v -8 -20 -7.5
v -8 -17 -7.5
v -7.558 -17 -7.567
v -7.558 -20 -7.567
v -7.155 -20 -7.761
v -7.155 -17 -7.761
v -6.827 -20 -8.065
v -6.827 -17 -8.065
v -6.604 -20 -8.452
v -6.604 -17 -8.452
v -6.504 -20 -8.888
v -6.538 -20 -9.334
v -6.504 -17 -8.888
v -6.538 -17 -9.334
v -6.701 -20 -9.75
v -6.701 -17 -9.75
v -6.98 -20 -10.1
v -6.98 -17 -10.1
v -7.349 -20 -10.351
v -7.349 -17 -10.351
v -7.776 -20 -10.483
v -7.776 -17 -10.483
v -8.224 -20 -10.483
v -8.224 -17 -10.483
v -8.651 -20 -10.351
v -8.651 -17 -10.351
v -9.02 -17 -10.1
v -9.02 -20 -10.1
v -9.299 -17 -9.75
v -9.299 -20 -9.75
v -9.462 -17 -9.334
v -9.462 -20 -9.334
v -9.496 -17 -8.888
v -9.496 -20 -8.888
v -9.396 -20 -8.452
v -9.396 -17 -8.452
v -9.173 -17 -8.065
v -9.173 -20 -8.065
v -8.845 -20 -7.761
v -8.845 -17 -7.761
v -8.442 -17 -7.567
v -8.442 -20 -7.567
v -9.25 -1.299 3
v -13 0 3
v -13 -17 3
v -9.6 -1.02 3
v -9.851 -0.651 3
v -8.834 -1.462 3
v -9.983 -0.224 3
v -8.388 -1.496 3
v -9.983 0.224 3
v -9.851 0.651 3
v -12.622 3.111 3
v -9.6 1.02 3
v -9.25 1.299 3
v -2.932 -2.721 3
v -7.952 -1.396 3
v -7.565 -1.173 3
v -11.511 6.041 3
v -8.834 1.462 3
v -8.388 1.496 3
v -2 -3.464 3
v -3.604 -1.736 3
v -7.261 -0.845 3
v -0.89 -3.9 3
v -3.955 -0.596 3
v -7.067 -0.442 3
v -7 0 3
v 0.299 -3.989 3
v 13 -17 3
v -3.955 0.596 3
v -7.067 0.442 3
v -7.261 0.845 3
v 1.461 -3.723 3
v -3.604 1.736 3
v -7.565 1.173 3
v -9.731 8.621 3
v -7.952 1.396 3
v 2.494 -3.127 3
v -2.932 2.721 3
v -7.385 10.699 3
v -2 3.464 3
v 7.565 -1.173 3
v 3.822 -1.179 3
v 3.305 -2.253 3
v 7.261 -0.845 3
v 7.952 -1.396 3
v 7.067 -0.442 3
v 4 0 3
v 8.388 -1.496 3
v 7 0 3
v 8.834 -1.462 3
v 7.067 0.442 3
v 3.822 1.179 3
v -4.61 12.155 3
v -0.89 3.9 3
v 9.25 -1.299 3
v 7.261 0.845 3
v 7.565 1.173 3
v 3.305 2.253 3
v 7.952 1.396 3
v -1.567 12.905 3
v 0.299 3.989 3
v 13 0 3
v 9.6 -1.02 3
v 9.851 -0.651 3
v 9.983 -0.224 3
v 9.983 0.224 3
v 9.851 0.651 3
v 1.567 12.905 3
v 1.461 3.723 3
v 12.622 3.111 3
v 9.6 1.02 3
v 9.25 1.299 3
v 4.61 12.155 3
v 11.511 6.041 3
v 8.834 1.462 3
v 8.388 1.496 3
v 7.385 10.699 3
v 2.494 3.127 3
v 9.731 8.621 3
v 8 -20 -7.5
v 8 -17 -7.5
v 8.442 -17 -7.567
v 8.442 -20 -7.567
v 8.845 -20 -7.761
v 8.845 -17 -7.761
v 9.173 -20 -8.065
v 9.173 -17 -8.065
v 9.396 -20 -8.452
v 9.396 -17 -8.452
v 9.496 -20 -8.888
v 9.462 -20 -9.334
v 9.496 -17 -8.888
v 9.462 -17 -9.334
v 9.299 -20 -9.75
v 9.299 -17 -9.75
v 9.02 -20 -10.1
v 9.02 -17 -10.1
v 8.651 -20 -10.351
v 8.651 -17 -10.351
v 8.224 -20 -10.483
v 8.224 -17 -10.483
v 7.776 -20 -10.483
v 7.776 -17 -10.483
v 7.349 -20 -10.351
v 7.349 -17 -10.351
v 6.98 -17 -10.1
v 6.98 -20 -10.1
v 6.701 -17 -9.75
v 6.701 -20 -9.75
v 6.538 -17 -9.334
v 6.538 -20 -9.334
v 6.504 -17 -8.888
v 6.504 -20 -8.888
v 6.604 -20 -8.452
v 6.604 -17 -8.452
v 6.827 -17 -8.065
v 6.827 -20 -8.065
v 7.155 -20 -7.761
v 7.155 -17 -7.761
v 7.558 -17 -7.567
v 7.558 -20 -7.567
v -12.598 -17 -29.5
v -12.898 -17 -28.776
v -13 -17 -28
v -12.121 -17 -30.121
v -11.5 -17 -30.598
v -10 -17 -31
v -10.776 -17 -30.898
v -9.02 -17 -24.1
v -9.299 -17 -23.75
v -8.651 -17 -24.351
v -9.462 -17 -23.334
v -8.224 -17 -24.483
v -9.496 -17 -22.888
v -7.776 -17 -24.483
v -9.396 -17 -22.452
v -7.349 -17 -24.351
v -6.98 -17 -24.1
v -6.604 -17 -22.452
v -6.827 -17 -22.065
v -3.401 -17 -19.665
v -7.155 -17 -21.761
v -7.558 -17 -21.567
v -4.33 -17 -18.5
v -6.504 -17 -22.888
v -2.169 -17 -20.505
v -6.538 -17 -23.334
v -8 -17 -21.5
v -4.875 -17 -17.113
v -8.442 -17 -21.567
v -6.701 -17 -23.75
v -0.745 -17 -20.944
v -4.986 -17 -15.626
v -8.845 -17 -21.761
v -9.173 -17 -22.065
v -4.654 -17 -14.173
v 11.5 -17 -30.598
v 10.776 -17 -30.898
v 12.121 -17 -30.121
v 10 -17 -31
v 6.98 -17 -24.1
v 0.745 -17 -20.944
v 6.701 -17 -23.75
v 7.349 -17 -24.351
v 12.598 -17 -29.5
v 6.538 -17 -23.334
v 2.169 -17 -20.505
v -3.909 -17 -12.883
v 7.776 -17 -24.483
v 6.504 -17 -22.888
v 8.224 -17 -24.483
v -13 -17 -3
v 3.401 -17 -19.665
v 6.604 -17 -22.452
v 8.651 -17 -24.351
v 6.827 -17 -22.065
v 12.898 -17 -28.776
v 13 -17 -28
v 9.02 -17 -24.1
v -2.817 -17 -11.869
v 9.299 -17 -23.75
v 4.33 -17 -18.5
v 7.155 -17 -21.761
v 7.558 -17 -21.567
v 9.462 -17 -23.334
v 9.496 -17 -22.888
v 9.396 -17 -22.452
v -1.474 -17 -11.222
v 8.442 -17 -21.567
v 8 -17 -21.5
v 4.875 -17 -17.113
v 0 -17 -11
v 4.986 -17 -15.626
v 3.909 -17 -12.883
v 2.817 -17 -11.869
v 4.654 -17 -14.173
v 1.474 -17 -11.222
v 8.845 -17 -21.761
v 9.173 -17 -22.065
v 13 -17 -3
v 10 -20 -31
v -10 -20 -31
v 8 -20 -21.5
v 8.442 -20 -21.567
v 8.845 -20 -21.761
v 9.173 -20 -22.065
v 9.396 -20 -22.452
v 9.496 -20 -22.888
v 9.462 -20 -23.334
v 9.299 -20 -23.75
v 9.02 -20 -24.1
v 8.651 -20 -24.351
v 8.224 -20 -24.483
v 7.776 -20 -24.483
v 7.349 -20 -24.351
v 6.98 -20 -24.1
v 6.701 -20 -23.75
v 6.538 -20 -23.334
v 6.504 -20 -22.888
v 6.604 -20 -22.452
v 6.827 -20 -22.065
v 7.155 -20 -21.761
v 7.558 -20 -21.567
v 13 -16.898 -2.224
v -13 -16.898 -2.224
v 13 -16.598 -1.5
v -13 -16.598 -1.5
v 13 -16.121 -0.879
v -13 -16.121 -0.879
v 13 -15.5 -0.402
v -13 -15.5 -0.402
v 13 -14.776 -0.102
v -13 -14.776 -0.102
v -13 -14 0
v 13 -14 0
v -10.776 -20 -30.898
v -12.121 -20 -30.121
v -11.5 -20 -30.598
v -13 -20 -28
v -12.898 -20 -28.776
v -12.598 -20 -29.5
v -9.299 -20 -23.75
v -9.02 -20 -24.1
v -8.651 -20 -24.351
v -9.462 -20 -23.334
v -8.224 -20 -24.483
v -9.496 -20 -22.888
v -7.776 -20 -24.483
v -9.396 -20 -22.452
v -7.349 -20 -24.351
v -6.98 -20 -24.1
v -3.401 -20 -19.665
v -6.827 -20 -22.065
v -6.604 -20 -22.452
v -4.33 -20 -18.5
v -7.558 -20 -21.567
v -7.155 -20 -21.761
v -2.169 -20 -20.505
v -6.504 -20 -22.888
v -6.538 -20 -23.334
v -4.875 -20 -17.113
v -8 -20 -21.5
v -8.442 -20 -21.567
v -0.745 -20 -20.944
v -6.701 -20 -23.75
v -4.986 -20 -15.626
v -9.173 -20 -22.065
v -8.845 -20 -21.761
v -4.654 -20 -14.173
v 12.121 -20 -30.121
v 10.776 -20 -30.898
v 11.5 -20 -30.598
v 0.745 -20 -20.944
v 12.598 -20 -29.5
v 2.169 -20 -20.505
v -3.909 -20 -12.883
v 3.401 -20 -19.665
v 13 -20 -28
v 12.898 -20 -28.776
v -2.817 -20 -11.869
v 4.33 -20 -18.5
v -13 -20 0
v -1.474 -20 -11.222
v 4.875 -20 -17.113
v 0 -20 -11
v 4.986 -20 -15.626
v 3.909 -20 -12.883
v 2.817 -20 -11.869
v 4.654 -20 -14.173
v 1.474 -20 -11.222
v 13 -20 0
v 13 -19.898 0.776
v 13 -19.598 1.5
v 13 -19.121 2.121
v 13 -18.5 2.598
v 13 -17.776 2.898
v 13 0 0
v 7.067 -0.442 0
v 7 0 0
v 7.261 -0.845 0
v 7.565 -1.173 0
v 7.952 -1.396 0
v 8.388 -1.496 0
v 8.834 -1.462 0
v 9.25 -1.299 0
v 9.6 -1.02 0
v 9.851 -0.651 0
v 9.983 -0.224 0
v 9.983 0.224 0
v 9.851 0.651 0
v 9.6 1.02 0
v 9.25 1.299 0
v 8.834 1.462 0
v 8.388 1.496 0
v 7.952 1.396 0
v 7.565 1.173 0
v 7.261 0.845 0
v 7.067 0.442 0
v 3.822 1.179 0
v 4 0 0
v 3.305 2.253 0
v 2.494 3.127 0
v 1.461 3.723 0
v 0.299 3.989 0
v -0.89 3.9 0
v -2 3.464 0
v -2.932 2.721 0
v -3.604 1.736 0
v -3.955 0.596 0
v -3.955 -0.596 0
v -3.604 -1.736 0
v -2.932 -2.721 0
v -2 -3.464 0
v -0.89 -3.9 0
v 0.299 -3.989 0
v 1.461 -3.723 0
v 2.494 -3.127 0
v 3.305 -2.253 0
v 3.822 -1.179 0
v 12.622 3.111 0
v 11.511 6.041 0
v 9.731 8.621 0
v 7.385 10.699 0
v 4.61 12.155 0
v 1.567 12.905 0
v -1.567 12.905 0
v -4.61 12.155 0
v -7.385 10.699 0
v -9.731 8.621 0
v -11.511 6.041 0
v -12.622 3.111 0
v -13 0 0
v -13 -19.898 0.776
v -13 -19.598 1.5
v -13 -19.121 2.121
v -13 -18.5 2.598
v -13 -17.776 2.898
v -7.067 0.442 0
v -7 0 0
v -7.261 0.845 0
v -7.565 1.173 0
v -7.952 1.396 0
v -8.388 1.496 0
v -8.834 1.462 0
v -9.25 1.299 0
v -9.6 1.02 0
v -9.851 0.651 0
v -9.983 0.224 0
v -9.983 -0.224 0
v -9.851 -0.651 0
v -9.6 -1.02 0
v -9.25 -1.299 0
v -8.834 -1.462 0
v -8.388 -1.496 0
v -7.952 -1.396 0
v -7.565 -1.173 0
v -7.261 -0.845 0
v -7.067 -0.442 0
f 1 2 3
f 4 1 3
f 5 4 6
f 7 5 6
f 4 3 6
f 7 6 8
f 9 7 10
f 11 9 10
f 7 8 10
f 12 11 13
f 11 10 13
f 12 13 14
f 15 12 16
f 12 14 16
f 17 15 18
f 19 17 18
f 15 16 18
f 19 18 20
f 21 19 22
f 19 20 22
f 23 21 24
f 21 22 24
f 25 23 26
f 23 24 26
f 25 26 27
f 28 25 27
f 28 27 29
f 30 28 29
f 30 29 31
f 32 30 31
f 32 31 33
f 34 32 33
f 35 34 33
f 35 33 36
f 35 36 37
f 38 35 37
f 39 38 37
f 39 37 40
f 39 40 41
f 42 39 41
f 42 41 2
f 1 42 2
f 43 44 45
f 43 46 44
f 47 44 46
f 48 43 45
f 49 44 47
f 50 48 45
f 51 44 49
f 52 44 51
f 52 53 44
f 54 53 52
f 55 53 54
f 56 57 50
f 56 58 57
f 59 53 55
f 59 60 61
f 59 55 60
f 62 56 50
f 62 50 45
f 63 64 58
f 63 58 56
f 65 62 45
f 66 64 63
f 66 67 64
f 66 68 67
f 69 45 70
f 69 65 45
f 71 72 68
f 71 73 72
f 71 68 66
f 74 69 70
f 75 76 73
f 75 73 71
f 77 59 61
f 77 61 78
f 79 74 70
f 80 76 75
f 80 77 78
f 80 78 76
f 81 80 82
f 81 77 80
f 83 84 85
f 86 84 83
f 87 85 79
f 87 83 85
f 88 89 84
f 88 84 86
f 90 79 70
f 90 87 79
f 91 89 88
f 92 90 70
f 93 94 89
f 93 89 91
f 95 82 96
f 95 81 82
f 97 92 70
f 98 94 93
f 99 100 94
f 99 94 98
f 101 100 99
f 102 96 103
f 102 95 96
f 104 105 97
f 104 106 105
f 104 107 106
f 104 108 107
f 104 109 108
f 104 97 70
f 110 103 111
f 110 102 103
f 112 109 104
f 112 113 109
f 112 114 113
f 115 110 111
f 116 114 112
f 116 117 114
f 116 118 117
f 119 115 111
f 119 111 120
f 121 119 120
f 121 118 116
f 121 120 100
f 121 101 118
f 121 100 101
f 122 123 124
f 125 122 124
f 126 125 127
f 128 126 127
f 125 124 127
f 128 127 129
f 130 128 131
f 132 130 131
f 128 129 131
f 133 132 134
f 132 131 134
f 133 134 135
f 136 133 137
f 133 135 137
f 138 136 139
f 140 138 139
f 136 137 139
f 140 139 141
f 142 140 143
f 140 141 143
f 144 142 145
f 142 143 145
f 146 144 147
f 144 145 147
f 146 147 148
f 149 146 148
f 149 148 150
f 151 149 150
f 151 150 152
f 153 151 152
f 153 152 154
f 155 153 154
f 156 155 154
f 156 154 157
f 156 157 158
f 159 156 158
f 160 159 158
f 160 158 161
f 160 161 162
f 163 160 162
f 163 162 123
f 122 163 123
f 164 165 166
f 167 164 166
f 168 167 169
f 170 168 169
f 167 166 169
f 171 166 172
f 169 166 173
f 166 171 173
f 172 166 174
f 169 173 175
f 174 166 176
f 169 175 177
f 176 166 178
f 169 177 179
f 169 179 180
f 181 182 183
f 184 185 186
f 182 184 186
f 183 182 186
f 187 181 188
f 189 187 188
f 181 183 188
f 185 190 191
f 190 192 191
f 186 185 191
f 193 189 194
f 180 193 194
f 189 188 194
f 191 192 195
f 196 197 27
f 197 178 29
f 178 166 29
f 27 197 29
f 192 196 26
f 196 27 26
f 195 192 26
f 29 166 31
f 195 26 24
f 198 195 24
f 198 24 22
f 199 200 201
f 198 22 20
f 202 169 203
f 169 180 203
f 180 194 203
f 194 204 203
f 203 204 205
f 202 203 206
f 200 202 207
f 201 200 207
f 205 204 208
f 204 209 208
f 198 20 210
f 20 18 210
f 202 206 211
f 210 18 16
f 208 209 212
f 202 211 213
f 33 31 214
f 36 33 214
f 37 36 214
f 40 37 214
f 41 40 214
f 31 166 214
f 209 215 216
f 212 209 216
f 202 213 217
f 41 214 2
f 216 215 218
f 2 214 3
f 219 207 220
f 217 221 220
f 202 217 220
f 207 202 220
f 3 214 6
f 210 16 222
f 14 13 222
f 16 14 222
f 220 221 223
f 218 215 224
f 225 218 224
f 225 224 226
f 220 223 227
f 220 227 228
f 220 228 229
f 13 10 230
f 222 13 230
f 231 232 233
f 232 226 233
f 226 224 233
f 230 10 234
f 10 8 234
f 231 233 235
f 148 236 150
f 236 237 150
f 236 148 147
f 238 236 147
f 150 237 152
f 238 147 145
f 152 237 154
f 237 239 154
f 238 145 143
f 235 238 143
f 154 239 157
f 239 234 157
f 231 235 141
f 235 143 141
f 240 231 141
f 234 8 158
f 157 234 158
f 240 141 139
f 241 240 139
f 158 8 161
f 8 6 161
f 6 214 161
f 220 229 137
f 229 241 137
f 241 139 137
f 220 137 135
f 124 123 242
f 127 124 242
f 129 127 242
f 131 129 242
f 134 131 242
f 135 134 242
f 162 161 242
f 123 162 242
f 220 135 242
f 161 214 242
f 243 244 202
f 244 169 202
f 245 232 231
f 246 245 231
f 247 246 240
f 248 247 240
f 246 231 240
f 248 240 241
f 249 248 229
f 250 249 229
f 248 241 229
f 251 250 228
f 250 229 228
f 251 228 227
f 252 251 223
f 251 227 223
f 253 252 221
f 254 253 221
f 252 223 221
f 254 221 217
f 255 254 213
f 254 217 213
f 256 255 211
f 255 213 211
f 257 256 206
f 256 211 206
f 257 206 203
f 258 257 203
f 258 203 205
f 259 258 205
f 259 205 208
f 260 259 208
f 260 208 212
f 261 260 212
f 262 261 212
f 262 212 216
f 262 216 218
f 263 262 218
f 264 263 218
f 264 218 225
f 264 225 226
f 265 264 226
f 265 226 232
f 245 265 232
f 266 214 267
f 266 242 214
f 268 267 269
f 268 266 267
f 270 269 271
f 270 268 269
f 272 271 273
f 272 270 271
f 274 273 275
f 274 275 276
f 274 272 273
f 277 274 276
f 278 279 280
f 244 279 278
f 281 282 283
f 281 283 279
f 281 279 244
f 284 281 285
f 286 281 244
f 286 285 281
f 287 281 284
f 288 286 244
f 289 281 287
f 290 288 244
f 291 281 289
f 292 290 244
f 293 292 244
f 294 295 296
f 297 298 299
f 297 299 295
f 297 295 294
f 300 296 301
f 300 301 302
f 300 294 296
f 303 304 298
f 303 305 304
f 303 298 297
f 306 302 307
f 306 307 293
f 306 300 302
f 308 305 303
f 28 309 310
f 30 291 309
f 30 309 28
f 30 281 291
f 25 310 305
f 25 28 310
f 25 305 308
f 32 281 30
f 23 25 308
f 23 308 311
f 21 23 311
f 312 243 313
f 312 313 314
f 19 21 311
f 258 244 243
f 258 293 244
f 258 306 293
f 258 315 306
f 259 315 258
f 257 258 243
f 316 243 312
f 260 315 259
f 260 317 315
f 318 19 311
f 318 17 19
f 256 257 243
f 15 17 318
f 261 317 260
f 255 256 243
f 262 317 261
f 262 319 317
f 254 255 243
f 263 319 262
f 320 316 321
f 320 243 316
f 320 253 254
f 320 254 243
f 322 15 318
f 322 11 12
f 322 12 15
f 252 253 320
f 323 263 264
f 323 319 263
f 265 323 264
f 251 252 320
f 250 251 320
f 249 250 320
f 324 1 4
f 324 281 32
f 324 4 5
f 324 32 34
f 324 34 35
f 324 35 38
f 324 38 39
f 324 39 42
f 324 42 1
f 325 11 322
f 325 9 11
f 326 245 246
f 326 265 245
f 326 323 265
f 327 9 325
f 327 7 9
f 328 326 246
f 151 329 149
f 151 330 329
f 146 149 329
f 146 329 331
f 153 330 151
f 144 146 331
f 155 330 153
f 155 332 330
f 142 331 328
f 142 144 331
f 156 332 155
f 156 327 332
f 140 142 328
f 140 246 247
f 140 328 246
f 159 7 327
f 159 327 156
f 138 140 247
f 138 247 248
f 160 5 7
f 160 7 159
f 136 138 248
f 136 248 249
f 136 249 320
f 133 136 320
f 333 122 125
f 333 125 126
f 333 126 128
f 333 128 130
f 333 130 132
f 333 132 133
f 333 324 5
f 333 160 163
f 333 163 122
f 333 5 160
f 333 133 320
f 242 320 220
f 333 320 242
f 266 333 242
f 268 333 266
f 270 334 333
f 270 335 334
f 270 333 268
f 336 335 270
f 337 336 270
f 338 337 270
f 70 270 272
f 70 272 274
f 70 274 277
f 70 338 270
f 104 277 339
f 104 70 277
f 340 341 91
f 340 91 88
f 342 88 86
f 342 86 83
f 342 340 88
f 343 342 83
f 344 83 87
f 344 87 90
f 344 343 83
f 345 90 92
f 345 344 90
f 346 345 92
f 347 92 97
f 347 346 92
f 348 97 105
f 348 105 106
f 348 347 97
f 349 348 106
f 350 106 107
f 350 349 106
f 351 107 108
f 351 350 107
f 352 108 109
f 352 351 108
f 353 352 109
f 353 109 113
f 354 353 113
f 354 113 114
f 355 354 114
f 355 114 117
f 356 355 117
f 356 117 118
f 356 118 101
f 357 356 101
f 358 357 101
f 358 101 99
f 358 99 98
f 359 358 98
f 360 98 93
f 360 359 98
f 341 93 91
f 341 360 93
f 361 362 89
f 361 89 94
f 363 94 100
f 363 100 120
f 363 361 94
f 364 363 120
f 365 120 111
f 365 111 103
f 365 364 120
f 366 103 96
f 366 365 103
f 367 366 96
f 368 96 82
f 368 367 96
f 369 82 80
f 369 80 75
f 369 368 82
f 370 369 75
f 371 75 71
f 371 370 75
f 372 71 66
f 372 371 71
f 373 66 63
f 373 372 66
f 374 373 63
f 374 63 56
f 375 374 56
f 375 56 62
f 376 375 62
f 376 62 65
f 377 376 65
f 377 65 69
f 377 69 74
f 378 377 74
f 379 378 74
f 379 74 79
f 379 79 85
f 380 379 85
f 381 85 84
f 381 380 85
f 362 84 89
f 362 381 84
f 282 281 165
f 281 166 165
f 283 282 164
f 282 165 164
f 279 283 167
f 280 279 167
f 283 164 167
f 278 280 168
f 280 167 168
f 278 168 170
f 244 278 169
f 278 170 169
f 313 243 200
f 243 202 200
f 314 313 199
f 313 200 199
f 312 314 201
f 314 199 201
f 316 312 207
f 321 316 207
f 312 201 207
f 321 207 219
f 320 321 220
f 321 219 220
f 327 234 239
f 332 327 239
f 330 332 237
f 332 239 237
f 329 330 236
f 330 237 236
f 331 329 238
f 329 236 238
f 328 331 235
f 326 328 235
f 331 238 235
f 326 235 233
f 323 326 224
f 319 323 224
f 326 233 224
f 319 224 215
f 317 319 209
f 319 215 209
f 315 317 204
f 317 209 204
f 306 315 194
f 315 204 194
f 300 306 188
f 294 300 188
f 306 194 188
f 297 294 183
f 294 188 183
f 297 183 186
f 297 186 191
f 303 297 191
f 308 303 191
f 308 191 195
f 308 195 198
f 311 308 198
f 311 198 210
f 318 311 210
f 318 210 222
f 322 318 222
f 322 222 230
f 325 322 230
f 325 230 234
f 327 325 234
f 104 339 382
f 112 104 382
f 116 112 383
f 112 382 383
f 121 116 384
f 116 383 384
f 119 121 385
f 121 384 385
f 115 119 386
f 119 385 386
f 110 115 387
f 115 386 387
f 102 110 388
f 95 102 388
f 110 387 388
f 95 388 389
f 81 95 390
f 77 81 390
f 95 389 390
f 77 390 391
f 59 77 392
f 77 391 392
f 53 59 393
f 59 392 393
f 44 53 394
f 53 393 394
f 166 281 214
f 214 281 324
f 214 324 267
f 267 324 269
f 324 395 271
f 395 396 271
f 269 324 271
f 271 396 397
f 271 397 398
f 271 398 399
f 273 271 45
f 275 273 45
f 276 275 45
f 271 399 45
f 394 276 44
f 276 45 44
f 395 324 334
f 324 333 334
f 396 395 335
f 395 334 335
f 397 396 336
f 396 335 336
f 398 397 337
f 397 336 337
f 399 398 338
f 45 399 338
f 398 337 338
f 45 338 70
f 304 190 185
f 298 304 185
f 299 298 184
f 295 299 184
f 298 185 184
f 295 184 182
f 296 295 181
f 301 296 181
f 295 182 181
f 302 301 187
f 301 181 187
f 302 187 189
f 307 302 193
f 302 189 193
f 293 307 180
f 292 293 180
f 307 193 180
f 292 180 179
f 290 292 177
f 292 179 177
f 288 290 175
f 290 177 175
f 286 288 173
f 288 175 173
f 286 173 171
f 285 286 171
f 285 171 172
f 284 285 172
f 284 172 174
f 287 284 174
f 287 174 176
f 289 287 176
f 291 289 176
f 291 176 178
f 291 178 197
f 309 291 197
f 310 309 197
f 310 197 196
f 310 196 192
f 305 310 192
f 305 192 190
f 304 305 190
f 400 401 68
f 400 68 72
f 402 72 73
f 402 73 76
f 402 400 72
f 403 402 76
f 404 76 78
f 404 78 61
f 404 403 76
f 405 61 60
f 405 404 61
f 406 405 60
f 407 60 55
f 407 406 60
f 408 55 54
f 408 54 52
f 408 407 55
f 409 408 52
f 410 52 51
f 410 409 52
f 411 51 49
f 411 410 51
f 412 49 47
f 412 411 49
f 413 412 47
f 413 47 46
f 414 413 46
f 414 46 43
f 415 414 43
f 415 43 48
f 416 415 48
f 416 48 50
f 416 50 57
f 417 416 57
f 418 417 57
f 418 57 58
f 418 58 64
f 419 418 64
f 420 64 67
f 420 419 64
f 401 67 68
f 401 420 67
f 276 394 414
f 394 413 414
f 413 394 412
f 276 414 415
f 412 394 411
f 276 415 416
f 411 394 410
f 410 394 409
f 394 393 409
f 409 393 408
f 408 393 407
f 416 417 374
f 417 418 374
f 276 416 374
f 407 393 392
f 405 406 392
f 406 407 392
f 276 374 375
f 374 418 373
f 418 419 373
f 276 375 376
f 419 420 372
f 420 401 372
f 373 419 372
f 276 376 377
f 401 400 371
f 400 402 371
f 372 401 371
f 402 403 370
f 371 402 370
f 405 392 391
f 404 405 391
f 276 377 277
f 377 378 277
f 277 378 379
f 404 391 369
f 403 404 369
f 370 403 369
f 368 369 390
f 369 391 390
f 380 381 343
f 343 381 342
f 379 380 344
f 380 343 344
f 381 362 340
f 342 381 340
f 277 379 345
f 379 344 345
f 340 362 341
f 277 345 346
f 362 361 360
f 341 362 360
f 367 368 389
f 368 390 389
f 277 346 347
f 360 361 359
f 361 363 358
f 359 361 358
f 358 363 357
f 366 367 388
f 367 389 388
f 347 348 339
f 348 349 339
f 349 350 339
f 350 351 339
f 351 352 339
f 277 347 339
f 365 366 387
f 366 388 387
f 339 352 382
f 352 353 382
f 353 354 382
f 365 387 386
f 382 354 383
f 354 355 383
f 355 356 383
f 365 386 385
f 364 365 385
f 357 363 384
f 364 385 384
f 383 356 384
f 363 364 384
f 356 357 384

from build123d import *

# Parameters (mm, degrees)
SKETCH_1_R          = 4
SKETCH_1_R_2        = 1.5
EXTRUDE_1_DEPTH     = 3
SKETCH_2_W          = 26
SKETCH_2_H          = 3
EXTRUDE_2_DEPTH     = 31
SKETCH_3_R          = 5
SKETCH_3_R_2        = 1.5
CUT_EXTRUDE_1_DEPTH = 40.115214431
FILLET_1_R          = 3


with BuildPart() as part:
    # 草图1 → 凸台-拉伸1 (new body)
    with BuildSketch(Plane.XY):
        with BuildLine():
            Line((-13, 0), (-13, -20))
            Line((-13, -20), (13, -20))
            Line((13, -20), (13, 0))
            ThreePointArc((13, 0), (0, 13), (-13, 0))
        make_face()
        Circle(SKETCH_1_R, mode=Mode.SUBTRACT)
        with Locations((-8.5, 0)):
            Circle(SKETCH_1_R_2, mode=Mode.SUBTRACT)
        with Locations(Location((8.5, 0, 0), (0, 0, 180))):
            Circle(SKETCH_1_R_2, mode=Mode.SUBTRACT)
    extrude(amount=EXTRUDE_1_DEPTH)

    # 草图2 → 凸台-拉伸2 (add)
    with BuildSketch(Plane.XY):
        with Locations((0, -18.5)):
            Rectangle(SKETCH_2_W, SKETCH_2_H)
    extrude(amount=-EXTRUDE_2_DEPTH)

    # 草图3 → 切除-拉伸1 (cut, through all)
    with BuildSketch(Plane(origin=(0, 0, 0), x_dir=(1, 0, 0), z_dir=(0, 1, 0))):
        with Locations(Location((0, 16, 0), (0, 0, 270))):
            Circle(SKETCH_3_R)
        with Locations(Location((-8, 23, 0), (0, 0, 270))):
            Circle(SKETCH_3_R_2)
        with Locations(Location((8, 23, 0), (0, 0, 270))):
            Circle(SKETCH_3_R_2)
        with Locations(Location((8, 9, 0), (0, 0, 270))):
            Circle(SKETCH_3_R_2)
        with Locations(Location((-8, 9, 0), (0, 0, 270))):
            Circle(SKETCH_3_R_2)
    extrude(amount=-CUT_EXTRUDE_1_DEPTH, mode=Mode.SUBTRACT)

    # 圆角1
    fillet_1_edges = [part.edges().sort_by_distance(p)[0] for p in [
        (0, -20, 3),
        (-13, -18.5, -31),
        (13, -18.5, -31),
        (0, -17, 0),
    ]]
    fillet(fillet_1_edges, radius=FILLET_1_R)


solid = part.part
